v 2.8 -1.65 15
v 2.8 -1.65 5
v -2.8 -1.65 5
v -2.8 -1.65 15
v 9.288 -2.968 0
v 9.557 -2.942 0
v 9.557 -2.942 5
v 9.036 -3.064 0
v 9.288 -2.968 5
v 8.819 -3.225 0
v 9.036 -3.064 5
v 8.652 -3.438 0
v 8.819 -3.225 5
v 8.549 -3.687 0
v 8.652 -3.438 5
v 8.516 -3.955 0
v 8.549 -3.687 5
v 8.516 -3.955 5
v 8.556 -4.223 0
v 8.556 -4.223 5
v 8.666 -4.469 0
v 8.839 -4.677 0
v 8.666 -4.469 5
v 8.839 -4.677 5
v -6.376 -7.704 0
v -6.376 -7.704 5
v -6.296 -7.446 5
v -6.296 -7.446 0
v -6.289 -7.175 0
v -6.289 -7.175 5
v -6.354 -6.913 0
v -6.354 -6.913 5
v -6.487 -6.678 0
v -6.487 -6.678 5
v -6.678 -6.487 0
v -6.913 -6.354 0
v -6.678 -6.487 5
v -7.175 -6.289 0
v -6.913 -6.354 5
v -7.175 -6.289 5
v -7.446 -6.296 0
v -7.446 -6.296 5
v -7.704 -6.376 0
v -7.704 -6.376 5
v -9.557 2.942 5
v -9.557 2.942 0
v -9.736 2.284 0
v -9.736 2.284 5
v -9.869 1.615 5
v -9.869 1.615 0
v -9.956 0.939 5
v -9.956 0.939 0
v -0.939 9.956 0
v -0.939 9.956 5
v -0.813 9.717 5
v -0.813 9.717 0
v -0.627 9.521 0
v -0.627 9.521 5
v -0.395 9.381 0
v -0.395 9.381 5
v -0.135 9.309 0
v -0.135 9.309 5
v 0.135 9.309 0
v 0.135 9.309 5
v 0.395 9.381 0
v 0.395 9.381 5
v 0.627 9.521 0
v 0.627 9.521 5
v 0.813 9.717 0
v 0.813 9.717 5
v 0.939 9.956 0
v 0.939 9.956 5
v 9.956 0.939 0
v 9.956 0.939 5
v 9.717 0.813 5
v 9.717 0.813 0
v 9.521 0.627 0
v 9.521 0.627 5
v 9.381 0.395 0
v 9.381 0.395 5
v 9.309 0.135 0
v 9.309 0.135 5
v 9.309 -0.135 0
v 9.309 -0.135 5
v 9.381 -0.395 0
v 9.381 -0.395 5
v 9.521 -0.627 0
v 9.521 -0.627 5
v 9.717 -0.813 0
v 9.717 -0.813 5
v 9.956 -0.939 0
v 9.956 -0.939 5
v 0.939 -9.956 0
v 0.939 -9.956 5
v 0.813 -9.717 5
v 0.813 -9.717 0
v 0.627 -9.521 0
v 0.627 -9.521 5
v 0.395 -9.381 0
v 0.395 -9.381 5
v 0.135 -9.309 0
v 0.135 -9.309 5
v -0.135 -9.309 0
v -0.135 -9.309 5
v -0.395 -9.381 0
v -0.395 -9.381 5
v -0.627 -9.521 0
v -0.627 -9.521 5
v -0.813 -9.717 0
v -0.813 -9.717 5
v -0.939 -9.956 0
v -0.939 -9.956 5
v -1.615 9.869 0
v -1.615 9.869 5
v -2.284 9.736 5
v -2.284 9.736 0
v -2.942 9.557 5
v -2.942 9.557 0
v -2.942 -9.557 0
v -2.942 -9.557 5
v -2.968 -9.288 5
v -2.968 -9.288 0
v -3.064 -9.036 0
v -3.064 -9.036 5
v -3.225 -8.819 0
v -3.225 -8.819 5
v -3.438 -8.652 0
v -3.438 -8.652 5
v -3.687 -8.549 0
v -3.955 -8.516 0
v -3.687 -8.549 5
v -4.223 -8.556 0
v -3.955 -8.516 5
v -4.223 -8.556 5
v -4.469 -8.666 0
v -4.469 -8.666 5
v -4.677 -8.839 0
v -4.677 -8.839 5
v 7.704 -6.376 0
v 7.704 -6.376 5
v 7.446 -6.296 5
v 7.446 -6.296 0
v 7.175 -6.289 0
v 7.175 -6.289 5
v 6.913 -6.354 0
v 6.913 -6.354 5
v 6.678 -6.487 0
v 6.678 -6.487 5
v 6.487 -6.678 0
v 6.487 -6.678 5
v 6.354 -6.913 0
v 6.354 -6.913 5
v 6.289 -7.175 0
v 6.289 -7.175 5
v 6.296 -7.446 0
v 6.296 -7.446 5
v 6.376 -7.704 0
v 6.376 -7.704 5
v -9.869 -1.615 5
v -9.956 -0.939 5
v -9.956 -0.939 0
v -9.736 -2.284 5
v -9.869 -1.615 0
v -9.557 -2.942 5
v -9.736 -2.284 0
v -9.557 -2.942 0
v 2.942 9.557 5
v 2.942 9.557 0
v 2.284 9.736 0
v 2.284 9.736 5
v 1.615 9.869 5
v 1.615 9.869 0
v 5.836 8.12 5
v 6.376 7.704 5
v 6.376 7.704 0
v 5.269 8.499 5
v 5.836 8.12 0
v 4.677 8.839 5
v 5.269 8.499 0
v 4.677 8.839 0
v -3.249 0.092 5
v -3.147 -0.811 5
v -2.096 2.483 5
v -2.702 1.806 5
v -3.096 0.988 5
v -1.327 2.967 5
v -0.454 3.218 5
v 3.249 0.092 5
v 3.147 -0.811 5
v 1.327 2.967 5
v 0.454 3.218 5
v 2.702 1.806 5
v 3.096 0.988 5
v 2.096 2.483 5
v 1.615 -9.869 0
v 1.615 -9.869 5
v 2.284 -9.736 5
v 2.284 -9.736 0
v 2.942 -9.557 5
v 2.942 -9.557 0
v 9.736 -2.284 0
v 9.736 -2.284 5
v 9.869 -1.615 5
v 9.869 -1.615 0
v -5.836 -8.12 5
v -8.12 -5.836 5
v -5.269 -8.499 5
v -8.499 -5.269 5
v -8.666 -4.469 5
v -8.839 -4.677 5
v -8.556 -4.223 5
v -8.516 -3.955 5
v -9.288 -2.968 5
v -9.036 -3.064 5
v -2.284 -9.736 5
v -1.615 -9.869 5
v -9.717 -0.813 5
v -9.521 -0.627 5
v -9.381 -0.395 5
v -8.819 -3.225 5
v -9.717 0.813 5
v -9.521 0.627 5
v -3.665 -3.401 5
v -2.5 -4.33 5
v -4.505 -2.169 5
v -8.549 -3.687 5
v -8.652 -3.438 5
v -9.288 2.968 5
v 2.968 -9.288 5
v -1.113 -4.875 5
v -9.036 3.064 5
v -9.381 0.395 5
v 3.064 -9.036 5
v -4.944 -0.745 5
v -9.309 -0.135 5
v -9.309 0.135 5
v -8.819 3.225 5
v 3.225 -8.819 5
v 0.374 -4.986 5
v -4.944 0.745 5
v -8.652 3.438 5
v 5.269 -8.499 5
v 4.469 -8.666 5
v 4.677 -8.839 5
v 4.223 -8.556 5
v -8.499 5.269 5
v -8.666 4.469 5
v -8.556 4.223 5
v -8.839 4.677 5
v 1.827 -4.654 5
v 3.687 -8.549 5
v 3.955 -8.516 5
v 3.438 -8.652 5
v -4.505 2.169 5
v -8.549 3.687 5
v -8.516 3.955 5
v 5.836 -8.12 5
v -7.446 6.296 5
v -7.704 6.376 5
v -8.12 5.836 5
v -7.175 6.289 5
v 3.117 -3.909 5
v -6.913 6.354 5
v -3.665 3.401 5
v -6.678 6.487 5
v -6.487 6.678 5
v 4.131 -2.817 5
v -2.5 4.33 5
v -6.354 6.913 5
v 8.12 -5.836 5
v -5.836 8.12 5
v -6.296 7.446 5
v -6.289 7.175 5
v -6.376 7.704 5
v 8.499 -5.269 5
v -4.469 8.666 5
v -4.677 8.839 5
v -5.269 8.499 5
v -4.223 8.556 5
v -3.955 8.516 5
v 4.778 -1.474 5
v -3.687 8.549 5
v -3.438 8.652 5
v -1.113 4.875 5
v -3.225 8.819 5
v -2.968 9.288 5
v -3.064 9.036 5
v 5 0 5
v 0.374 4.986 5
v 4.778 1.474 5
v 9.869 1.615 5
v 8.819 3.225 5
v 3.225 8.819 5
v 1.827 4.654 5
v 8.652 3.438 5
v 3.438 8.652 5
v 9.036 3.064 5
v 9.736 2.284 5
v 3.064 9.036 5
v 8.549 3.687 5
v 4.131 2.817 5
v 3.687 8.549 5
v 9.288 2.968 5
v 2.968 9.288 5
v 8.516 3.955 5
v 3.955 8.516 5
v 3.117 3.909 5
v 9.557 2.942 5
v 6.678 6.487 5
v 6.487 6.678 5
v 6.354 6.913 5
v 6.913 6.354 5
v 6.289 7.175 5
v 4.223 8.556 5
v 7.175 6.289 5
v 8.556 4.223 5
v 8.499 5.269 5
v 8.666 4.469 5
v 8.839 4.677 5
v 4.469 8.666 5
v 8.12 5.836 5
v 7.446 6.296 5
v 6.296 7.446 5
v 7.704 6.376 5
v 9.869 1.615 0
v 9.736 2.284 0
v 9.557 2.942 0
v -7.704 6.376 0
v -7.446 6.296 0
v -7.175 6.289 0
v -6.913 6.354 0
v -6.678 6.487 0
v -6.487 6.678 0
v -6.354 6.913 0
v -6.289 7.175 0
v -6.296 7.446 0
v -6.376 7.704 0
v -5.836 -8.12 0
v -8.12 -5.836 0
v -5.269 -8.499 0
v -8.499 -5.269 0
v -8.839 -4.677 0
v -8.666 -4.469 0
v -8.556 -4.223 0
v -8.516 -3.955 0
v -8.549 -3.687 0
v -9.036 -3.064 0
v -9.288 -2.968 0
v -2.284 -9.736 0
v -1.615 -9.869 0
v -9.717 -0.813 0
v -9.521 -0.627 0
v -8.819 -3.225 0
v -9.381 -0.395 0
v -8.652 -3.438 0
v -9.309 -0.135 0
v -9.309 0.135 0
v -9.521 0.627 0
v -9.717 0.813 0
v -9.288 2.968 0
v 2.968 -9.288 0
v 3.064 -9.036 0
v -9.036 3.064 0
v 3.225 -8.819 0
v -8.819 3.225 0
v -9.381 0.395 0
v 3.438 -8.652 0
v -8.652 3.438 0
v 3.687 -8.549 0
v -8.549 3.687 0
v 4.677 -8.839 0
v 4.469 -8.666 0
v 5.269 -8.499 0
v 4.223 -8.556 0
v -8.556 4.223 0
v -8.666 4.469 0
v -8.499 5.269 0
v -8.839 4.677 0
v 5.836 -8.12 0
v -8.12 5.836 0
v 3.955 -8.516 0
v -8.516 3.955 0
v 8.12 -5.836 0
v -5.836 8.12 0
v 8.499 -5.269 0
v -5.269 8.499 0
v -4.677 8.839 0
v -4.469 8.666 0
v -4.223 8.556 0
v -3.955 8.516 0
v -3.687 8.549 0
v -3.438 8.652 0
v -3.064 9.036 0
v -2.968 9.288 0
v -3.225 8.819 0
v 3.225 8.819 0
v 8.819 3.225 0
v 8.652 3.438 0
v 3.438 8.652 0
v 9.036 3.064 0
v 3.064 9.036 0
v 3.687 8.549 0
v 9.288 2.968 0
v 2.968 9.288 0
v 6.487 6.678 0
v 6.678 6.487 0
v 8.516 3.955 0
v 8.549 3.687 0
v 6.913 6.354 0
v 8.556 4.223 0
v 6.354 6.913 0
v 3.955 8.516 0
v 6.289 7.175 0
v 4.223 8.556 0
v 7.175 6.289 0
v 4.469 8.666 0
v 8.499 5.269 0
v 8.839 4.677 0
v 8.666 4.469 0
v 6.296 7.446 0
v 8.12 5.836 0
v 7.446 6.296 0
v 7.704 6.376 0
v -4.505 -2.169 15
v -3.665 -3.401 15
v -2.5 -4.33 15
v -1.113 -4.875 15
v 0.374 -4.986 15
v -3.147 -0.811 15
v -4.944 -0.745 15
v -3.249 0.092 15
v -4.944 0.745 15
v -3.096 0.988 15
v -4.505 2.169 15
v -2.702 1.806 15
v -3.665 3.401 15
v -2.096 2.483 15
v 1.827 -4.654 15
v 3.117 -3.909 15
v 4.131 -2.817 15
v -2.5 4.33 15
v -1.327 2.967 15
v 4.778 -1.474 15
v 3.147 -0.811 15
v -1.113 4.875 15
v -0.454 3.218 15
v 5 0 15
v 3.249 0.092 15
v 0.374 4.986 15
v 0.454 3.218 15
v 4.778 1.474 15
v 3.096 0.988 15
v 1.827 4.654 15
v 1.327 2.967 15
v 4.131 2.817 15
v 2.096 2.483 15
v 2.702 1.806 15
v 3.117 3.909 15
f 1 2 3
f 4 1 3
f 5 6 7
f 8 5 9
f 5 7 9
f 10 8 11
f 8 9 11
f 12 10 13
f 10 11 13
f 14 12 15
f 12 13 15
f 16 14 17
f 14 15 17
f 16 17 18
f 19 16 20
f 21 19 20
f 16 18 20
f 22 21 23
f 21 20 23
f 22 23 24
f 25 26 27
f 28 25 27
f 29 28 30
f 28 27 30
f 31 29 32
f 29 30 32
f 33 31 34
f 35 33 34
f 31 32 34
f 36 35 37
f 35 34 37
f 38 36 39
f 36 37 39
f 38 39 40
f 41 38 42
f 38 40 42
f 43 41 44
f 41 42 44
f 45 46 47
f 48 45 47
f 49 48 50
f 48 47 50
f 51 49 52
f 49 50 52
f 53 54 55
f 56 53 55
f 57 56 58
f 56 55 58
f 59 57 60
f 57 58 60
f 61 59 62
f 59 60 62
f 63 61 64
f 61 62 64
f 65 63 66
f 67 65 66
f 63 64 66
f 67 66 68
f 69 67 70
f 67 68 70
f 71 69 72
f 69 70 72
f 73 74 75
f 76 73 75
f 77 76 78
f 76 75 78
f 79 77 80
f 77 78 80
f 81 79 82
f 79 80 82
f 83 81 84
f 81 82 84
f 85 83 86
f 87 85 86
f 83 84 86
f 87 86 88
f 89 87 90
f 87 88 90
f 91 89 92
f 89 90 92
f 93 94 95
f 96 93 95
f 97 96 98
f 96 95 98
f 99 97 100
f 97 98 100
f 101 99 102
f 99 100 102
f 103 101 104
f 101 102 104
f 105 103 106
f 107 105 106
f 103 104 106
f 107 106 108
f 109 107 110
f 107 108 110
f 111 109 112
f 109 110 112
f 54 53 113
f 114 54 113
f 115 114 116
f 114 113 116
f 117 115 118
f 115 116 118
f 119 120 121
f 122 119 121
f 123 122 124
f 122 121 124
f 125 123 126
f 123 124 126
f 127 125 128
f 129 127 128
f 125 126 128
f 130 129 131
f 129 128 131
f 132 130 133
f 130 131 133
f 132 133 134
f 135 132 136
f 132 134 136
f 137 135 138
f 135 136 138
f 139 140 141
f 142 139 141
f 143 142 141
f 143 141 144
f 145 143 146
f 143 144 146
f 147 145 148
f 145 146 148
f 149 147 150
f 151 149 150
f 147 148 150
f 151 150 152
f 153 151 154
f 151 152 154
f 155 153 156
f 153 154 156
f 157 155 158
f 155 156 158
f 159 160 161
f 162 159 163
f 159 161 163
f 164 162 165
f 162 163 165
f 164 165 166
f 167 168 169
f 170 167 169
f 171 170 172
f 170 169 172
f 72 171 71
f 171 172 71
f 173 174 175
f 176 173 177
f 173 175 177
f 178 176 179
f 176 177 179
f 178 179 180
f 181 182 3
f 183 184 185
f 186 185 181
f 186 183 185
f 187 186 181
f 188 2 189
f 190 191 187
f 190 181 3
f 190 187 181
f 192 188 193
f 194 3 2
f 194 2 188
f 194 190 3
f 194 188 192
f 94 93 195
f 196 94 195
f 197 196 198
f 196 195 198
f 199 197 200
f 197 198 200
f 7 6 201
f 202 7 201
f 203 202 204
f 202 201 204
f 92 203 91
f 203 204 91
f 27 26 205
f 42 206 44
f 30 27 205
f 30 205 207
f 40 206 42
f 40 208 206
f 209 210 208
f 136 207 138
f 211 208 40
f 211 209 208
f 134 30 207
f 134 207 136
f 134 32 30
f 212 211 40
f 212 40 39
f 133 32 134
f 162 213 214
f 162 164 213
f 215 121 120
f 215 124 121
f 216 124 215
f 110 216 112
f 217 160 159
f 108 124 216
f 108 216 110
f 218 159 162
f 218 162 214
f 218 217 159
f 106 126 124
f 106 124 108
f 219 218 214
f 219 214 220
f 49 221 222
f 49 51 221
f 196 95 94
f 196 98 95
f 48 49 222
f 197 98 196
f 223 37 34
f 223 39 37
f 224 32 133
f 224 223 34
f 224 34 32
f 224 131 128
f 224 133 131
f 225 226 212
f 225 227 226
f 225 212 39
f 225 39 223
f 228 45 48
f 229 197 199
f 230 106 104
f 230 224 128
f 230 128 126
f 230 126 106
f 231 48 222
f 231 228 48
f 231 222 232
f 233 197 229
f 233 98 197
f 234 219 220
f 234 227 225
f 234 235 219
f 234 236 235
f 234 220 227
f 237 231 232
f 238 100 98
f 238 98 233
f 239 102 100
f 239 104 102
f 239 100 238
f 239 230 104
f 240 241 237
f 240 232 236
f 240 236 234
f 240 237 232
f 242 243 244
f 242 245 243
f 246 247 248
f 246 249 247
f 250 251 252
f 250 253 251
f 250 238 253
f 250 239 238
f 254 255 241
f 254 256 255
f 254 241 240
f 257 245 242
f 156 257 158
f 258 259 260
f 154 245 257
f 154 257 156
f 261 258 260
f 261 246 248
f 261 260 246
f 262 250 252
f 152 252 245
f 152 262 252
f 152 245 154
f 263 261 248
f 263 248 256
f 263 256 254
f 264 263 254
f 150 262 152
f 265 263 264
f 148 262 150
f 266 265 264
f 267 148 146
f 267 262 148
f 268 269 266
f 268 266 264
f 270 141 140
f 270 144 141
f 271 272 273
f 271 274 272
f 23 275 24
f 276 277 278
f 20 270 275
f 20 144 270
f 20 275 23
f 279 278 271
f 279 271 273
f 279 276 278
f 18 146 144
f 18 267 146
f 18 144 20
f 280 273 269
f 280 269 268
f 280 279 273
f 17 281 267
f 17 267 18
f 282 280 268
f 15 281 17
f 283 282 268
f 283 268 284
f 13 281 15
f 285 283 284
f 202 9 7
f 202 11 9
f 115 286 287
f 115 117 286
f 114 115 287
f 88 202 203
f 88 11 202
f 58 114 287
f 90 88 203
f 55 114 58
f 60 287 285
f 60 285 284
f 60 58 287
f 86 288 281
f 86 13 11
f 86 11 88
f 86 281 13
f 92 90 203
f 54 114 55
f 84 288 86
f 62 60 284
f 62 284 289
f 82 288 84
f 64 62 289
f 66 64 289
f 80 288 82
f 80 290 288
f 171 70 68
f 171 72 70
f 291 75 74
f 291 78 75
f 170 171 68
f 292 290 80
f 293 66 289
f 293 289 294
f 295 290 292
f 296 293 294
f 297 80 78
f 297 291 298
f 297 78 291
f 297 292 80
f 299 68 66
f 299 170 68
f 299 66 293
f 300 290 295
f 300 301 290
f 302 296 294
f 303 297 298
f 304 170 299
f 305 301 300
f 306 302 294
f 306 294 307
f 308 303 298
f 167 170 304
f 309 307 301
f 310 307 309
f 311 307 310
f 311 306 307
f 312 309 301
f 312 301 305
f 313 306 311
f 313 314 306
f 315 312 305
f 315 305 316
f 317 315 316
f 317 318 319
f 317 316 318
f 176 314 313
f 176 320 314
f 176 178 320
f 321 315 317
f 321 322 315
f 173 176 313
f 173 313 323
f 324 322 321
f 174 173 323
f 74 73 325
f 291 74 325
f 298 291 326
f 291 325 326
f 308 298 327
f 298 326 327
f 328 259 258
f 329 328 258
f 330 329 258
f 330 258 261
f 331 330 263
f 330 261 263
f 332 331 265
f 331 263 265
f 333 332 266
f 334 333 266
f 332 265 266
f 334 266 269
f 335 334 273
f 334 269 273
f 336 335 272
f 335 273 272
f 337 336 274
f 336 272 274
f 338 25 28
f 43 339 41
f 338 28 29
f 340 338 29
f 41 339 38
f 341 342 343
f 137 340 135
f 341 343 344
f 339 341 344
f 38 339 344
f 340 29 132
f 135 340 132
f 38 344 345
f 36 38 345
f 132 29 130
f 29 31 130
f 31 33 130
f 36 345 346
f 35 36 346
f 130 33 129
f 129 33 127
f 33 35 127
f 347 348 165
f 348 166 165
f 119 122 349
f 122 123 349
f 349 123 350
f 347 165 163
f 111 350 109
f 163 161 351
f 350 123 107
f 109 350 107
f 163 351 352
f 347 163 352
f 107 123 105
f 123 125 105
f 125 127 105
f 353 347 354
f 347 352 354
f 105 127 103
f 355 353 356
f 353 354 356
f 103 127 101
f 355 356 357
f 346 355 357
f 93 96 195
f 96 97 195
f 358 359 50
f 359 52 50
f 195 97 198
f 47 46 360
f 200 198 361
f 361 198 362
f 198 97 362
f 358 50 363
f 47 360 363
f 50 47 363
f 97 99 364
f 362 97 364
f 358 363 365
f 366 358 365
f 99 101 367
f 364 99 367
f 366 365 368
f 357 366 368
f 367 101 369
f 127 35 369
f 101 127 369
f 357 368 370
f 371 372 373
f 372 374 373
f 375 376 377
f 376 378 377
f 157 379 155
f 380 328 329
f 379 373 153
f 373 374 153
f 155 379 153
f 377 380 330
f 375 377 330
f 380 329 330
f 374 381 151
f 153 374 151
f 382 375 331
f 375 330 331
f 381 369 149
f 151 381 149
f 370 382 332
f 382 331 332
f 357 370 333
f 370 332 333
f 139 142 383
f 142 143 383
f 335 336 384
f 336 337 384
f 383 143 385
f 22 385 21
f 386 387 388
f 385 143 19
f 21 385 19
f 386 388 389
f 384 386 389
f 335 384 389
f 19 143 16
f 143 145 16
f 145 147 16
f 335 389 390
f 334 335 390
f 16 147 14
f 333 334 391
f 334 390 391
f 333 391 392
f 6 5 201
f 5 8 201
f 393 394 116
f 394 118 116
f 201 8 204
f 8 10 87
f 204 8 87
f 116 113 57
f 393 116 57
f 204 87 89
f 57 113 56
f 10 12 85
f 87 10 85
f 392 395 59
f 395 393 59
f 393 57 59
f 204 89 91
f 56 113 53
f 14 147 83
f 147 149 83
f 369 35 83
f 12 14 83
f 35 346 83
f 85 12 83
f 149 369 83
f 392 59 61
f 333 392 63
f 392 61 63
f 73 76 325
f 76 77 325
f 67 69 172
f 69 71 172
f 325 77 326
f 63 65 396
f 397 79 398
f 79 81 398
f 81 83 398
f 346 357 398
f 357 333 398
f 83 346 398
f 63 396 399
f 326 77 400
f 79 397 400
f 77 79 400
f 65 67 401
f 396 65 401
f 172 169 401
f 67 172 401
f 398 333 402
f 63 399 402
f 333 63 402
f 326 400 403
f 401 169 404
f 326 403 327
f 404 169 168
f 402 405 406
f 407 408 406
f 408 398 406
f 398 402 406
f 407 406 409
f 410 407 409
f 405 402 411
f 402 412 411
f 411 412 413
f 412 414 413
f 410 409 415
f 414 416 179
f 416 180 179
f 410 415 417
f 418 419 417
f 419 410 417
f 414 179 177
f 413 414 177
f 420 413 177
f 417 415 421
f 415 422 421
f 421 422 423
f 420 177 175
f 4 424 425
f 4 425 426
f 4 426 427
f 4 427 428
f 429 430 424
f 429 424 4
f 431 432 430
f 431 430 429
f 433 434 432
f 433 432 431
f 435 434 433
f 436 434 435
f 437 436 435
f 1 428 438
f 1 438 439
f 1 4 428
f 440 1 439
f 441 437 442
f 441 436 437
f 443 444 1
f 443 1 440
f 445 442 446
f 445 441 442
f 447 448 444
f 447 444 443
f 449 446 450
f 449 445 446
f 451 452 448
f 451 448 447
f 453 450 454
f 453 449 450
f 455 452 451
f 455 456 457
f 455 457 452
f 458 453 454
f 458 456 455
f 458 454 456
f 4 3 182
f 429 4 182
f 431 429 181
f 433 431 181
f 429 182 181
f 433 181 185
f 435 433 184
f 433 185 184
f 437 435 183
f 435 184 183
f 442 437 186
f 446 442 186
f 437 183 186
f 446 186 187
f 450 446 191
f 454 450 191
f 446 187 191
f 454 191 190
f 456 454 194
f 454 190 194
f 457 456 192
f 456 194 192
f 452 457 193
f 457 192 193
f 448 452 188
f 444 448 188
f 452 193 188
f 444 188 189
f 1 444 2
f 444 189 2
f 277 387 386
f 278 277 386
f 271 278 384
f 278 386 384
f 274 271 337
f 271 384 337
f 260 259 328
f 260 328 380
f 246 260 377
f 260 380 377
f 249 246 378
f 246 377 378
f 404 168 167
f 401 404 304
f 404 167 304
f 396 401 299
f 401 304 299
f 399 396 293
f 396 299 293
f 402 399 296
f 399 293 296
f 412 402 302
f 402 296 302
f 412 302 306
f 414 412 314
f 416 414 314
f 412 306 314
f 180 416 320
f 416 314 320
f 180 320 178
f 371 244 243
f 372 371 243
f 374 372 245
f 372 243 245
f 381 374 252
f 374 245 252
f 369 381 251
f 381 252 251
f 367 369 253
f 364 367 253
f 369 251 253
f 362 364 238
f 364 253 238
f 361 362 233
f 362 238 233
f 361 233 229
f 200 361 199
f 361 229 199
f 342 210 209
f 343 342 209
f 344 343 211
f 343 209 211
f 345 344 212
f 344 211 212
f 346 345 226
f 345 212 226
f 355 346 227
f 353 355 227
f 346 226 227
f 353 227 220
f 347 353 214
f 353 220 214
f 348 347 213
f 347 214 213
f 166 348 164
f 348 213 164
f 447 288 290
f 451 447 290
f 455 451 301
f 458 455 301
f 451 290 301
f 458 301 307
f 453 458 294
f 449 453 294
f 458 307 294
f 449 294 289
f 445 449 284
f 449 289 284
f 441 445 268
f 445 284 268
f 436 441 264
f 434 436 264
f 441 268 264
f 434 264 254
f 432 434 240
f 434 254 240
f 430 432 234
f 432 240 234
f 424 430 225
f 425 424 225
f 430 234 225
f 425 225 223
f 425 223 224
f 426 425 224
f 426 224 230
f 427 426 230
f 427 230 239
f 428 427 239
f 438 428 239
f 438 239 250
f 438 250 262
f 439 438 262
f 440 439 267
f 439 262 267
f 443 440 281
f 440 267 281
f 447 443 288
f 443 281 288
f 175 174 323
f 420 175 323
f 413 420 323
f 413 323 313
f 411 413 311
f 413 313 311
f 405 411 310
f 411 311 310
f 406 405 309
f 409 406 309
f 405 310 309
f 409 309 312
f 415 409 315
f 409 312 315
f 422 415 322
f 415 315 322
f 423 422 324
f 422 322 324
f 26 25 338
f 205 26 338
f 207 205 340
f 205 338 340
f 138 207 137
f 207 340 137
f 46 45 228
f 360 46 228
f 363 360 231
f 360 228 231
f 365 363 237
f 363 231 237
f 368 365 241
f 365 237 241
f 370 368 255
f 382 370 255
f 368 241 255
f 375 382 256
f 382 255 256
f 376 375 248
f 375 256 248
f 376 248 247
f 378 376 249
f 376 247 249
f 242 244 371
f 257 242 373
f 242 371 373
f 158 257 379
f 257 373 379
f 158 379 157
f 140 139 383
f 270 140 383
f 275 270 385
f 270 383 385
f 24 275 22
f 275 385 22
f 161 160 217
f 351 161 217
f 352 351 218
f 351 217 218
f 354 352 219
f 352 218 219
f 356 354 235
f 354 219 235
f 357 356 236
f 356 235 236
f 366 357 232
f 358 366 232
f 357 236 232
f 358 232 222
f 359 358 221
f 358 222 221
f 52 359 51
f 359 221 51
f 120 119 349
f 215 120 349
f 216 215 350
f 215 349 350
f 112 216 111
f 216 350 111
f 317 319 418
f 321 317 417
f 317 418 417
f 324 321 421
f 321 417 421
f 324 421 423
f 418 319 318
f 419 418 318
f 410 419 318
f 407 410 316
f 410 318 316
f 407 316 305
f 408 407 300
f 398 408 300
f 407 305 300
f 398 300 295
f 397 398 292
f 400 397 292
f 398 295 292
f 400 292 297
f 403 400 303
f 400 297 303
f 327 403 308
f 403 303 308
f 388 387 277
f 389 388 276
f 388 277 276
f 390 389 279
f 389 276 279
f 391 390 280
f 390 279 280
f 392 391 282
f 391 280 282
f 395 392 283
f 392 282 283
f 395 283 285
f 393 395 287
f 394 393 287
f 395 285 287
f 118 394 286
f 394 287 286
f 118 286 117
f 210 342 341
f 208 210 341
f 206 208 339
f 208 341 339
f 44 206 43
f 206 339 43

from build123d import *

# Parameters (mm, degrees)
F0_R            = 10
F1_DEPTH        = 5
F3_DEPTH        = 25
F3_COPIES_COUNT = 16
F5_R            = 5
F6_DEPTH        = 10


# Not quite as in the source:
# - a pattern or mirror of a feature is missing from the dataset's text; its kind, count and spacing are read off the source's solid


with BuildPart() as f1:
    # F0 (on Top) → F1 (new body)
    with BuildSketch(Plane.XY):
        Circle(F0_R)
    extrude(amount=F1_DEPTH)

    # F2 (on face) → F3 (cut)
    with BuildSketch(Plane.XY.offset(5)):
        with BuildLine():
            ThreePointArc((-0.9389056057, -9.9558252427), (0, -10), (0.9389056057, -9.9558252427))
            ThreePointArc((0.9389056057, -9.9558252427), (0, -9.3), (-0.9389056057, -9.9558252427))
        make_face()
    f3 = extrude(amount=-F3_DEPTH, mode=Mode.SUBTRACT)

    # F3_copies: F3 ×16 about axis
    f3_copies_axis = Axis((0, 0, 0), (0, 0, 1))
    for i in range(1, F3_COPIES_COUNT):
        add(f3.rotate(f3_copies_axis, i * 360 / F3_COPIES_COUNT), mode=Mode.SUBTRACT)

    # F5 (on face) → F6 (join)
    with BuildSketch(Plane.XY.offset(5)):
        Circle(F5_R)
        with BuildLine():
            ThreePointArc((-2.8, -1.65), (0, 3.25), (2.8, -1.65))
            Line((2.8, -1.65), (-2.8, -1.65))
        make_face(mode=Mode.SUBTRACT)
    extrude(amount=F6_DEPTH)


solid = f1.part
